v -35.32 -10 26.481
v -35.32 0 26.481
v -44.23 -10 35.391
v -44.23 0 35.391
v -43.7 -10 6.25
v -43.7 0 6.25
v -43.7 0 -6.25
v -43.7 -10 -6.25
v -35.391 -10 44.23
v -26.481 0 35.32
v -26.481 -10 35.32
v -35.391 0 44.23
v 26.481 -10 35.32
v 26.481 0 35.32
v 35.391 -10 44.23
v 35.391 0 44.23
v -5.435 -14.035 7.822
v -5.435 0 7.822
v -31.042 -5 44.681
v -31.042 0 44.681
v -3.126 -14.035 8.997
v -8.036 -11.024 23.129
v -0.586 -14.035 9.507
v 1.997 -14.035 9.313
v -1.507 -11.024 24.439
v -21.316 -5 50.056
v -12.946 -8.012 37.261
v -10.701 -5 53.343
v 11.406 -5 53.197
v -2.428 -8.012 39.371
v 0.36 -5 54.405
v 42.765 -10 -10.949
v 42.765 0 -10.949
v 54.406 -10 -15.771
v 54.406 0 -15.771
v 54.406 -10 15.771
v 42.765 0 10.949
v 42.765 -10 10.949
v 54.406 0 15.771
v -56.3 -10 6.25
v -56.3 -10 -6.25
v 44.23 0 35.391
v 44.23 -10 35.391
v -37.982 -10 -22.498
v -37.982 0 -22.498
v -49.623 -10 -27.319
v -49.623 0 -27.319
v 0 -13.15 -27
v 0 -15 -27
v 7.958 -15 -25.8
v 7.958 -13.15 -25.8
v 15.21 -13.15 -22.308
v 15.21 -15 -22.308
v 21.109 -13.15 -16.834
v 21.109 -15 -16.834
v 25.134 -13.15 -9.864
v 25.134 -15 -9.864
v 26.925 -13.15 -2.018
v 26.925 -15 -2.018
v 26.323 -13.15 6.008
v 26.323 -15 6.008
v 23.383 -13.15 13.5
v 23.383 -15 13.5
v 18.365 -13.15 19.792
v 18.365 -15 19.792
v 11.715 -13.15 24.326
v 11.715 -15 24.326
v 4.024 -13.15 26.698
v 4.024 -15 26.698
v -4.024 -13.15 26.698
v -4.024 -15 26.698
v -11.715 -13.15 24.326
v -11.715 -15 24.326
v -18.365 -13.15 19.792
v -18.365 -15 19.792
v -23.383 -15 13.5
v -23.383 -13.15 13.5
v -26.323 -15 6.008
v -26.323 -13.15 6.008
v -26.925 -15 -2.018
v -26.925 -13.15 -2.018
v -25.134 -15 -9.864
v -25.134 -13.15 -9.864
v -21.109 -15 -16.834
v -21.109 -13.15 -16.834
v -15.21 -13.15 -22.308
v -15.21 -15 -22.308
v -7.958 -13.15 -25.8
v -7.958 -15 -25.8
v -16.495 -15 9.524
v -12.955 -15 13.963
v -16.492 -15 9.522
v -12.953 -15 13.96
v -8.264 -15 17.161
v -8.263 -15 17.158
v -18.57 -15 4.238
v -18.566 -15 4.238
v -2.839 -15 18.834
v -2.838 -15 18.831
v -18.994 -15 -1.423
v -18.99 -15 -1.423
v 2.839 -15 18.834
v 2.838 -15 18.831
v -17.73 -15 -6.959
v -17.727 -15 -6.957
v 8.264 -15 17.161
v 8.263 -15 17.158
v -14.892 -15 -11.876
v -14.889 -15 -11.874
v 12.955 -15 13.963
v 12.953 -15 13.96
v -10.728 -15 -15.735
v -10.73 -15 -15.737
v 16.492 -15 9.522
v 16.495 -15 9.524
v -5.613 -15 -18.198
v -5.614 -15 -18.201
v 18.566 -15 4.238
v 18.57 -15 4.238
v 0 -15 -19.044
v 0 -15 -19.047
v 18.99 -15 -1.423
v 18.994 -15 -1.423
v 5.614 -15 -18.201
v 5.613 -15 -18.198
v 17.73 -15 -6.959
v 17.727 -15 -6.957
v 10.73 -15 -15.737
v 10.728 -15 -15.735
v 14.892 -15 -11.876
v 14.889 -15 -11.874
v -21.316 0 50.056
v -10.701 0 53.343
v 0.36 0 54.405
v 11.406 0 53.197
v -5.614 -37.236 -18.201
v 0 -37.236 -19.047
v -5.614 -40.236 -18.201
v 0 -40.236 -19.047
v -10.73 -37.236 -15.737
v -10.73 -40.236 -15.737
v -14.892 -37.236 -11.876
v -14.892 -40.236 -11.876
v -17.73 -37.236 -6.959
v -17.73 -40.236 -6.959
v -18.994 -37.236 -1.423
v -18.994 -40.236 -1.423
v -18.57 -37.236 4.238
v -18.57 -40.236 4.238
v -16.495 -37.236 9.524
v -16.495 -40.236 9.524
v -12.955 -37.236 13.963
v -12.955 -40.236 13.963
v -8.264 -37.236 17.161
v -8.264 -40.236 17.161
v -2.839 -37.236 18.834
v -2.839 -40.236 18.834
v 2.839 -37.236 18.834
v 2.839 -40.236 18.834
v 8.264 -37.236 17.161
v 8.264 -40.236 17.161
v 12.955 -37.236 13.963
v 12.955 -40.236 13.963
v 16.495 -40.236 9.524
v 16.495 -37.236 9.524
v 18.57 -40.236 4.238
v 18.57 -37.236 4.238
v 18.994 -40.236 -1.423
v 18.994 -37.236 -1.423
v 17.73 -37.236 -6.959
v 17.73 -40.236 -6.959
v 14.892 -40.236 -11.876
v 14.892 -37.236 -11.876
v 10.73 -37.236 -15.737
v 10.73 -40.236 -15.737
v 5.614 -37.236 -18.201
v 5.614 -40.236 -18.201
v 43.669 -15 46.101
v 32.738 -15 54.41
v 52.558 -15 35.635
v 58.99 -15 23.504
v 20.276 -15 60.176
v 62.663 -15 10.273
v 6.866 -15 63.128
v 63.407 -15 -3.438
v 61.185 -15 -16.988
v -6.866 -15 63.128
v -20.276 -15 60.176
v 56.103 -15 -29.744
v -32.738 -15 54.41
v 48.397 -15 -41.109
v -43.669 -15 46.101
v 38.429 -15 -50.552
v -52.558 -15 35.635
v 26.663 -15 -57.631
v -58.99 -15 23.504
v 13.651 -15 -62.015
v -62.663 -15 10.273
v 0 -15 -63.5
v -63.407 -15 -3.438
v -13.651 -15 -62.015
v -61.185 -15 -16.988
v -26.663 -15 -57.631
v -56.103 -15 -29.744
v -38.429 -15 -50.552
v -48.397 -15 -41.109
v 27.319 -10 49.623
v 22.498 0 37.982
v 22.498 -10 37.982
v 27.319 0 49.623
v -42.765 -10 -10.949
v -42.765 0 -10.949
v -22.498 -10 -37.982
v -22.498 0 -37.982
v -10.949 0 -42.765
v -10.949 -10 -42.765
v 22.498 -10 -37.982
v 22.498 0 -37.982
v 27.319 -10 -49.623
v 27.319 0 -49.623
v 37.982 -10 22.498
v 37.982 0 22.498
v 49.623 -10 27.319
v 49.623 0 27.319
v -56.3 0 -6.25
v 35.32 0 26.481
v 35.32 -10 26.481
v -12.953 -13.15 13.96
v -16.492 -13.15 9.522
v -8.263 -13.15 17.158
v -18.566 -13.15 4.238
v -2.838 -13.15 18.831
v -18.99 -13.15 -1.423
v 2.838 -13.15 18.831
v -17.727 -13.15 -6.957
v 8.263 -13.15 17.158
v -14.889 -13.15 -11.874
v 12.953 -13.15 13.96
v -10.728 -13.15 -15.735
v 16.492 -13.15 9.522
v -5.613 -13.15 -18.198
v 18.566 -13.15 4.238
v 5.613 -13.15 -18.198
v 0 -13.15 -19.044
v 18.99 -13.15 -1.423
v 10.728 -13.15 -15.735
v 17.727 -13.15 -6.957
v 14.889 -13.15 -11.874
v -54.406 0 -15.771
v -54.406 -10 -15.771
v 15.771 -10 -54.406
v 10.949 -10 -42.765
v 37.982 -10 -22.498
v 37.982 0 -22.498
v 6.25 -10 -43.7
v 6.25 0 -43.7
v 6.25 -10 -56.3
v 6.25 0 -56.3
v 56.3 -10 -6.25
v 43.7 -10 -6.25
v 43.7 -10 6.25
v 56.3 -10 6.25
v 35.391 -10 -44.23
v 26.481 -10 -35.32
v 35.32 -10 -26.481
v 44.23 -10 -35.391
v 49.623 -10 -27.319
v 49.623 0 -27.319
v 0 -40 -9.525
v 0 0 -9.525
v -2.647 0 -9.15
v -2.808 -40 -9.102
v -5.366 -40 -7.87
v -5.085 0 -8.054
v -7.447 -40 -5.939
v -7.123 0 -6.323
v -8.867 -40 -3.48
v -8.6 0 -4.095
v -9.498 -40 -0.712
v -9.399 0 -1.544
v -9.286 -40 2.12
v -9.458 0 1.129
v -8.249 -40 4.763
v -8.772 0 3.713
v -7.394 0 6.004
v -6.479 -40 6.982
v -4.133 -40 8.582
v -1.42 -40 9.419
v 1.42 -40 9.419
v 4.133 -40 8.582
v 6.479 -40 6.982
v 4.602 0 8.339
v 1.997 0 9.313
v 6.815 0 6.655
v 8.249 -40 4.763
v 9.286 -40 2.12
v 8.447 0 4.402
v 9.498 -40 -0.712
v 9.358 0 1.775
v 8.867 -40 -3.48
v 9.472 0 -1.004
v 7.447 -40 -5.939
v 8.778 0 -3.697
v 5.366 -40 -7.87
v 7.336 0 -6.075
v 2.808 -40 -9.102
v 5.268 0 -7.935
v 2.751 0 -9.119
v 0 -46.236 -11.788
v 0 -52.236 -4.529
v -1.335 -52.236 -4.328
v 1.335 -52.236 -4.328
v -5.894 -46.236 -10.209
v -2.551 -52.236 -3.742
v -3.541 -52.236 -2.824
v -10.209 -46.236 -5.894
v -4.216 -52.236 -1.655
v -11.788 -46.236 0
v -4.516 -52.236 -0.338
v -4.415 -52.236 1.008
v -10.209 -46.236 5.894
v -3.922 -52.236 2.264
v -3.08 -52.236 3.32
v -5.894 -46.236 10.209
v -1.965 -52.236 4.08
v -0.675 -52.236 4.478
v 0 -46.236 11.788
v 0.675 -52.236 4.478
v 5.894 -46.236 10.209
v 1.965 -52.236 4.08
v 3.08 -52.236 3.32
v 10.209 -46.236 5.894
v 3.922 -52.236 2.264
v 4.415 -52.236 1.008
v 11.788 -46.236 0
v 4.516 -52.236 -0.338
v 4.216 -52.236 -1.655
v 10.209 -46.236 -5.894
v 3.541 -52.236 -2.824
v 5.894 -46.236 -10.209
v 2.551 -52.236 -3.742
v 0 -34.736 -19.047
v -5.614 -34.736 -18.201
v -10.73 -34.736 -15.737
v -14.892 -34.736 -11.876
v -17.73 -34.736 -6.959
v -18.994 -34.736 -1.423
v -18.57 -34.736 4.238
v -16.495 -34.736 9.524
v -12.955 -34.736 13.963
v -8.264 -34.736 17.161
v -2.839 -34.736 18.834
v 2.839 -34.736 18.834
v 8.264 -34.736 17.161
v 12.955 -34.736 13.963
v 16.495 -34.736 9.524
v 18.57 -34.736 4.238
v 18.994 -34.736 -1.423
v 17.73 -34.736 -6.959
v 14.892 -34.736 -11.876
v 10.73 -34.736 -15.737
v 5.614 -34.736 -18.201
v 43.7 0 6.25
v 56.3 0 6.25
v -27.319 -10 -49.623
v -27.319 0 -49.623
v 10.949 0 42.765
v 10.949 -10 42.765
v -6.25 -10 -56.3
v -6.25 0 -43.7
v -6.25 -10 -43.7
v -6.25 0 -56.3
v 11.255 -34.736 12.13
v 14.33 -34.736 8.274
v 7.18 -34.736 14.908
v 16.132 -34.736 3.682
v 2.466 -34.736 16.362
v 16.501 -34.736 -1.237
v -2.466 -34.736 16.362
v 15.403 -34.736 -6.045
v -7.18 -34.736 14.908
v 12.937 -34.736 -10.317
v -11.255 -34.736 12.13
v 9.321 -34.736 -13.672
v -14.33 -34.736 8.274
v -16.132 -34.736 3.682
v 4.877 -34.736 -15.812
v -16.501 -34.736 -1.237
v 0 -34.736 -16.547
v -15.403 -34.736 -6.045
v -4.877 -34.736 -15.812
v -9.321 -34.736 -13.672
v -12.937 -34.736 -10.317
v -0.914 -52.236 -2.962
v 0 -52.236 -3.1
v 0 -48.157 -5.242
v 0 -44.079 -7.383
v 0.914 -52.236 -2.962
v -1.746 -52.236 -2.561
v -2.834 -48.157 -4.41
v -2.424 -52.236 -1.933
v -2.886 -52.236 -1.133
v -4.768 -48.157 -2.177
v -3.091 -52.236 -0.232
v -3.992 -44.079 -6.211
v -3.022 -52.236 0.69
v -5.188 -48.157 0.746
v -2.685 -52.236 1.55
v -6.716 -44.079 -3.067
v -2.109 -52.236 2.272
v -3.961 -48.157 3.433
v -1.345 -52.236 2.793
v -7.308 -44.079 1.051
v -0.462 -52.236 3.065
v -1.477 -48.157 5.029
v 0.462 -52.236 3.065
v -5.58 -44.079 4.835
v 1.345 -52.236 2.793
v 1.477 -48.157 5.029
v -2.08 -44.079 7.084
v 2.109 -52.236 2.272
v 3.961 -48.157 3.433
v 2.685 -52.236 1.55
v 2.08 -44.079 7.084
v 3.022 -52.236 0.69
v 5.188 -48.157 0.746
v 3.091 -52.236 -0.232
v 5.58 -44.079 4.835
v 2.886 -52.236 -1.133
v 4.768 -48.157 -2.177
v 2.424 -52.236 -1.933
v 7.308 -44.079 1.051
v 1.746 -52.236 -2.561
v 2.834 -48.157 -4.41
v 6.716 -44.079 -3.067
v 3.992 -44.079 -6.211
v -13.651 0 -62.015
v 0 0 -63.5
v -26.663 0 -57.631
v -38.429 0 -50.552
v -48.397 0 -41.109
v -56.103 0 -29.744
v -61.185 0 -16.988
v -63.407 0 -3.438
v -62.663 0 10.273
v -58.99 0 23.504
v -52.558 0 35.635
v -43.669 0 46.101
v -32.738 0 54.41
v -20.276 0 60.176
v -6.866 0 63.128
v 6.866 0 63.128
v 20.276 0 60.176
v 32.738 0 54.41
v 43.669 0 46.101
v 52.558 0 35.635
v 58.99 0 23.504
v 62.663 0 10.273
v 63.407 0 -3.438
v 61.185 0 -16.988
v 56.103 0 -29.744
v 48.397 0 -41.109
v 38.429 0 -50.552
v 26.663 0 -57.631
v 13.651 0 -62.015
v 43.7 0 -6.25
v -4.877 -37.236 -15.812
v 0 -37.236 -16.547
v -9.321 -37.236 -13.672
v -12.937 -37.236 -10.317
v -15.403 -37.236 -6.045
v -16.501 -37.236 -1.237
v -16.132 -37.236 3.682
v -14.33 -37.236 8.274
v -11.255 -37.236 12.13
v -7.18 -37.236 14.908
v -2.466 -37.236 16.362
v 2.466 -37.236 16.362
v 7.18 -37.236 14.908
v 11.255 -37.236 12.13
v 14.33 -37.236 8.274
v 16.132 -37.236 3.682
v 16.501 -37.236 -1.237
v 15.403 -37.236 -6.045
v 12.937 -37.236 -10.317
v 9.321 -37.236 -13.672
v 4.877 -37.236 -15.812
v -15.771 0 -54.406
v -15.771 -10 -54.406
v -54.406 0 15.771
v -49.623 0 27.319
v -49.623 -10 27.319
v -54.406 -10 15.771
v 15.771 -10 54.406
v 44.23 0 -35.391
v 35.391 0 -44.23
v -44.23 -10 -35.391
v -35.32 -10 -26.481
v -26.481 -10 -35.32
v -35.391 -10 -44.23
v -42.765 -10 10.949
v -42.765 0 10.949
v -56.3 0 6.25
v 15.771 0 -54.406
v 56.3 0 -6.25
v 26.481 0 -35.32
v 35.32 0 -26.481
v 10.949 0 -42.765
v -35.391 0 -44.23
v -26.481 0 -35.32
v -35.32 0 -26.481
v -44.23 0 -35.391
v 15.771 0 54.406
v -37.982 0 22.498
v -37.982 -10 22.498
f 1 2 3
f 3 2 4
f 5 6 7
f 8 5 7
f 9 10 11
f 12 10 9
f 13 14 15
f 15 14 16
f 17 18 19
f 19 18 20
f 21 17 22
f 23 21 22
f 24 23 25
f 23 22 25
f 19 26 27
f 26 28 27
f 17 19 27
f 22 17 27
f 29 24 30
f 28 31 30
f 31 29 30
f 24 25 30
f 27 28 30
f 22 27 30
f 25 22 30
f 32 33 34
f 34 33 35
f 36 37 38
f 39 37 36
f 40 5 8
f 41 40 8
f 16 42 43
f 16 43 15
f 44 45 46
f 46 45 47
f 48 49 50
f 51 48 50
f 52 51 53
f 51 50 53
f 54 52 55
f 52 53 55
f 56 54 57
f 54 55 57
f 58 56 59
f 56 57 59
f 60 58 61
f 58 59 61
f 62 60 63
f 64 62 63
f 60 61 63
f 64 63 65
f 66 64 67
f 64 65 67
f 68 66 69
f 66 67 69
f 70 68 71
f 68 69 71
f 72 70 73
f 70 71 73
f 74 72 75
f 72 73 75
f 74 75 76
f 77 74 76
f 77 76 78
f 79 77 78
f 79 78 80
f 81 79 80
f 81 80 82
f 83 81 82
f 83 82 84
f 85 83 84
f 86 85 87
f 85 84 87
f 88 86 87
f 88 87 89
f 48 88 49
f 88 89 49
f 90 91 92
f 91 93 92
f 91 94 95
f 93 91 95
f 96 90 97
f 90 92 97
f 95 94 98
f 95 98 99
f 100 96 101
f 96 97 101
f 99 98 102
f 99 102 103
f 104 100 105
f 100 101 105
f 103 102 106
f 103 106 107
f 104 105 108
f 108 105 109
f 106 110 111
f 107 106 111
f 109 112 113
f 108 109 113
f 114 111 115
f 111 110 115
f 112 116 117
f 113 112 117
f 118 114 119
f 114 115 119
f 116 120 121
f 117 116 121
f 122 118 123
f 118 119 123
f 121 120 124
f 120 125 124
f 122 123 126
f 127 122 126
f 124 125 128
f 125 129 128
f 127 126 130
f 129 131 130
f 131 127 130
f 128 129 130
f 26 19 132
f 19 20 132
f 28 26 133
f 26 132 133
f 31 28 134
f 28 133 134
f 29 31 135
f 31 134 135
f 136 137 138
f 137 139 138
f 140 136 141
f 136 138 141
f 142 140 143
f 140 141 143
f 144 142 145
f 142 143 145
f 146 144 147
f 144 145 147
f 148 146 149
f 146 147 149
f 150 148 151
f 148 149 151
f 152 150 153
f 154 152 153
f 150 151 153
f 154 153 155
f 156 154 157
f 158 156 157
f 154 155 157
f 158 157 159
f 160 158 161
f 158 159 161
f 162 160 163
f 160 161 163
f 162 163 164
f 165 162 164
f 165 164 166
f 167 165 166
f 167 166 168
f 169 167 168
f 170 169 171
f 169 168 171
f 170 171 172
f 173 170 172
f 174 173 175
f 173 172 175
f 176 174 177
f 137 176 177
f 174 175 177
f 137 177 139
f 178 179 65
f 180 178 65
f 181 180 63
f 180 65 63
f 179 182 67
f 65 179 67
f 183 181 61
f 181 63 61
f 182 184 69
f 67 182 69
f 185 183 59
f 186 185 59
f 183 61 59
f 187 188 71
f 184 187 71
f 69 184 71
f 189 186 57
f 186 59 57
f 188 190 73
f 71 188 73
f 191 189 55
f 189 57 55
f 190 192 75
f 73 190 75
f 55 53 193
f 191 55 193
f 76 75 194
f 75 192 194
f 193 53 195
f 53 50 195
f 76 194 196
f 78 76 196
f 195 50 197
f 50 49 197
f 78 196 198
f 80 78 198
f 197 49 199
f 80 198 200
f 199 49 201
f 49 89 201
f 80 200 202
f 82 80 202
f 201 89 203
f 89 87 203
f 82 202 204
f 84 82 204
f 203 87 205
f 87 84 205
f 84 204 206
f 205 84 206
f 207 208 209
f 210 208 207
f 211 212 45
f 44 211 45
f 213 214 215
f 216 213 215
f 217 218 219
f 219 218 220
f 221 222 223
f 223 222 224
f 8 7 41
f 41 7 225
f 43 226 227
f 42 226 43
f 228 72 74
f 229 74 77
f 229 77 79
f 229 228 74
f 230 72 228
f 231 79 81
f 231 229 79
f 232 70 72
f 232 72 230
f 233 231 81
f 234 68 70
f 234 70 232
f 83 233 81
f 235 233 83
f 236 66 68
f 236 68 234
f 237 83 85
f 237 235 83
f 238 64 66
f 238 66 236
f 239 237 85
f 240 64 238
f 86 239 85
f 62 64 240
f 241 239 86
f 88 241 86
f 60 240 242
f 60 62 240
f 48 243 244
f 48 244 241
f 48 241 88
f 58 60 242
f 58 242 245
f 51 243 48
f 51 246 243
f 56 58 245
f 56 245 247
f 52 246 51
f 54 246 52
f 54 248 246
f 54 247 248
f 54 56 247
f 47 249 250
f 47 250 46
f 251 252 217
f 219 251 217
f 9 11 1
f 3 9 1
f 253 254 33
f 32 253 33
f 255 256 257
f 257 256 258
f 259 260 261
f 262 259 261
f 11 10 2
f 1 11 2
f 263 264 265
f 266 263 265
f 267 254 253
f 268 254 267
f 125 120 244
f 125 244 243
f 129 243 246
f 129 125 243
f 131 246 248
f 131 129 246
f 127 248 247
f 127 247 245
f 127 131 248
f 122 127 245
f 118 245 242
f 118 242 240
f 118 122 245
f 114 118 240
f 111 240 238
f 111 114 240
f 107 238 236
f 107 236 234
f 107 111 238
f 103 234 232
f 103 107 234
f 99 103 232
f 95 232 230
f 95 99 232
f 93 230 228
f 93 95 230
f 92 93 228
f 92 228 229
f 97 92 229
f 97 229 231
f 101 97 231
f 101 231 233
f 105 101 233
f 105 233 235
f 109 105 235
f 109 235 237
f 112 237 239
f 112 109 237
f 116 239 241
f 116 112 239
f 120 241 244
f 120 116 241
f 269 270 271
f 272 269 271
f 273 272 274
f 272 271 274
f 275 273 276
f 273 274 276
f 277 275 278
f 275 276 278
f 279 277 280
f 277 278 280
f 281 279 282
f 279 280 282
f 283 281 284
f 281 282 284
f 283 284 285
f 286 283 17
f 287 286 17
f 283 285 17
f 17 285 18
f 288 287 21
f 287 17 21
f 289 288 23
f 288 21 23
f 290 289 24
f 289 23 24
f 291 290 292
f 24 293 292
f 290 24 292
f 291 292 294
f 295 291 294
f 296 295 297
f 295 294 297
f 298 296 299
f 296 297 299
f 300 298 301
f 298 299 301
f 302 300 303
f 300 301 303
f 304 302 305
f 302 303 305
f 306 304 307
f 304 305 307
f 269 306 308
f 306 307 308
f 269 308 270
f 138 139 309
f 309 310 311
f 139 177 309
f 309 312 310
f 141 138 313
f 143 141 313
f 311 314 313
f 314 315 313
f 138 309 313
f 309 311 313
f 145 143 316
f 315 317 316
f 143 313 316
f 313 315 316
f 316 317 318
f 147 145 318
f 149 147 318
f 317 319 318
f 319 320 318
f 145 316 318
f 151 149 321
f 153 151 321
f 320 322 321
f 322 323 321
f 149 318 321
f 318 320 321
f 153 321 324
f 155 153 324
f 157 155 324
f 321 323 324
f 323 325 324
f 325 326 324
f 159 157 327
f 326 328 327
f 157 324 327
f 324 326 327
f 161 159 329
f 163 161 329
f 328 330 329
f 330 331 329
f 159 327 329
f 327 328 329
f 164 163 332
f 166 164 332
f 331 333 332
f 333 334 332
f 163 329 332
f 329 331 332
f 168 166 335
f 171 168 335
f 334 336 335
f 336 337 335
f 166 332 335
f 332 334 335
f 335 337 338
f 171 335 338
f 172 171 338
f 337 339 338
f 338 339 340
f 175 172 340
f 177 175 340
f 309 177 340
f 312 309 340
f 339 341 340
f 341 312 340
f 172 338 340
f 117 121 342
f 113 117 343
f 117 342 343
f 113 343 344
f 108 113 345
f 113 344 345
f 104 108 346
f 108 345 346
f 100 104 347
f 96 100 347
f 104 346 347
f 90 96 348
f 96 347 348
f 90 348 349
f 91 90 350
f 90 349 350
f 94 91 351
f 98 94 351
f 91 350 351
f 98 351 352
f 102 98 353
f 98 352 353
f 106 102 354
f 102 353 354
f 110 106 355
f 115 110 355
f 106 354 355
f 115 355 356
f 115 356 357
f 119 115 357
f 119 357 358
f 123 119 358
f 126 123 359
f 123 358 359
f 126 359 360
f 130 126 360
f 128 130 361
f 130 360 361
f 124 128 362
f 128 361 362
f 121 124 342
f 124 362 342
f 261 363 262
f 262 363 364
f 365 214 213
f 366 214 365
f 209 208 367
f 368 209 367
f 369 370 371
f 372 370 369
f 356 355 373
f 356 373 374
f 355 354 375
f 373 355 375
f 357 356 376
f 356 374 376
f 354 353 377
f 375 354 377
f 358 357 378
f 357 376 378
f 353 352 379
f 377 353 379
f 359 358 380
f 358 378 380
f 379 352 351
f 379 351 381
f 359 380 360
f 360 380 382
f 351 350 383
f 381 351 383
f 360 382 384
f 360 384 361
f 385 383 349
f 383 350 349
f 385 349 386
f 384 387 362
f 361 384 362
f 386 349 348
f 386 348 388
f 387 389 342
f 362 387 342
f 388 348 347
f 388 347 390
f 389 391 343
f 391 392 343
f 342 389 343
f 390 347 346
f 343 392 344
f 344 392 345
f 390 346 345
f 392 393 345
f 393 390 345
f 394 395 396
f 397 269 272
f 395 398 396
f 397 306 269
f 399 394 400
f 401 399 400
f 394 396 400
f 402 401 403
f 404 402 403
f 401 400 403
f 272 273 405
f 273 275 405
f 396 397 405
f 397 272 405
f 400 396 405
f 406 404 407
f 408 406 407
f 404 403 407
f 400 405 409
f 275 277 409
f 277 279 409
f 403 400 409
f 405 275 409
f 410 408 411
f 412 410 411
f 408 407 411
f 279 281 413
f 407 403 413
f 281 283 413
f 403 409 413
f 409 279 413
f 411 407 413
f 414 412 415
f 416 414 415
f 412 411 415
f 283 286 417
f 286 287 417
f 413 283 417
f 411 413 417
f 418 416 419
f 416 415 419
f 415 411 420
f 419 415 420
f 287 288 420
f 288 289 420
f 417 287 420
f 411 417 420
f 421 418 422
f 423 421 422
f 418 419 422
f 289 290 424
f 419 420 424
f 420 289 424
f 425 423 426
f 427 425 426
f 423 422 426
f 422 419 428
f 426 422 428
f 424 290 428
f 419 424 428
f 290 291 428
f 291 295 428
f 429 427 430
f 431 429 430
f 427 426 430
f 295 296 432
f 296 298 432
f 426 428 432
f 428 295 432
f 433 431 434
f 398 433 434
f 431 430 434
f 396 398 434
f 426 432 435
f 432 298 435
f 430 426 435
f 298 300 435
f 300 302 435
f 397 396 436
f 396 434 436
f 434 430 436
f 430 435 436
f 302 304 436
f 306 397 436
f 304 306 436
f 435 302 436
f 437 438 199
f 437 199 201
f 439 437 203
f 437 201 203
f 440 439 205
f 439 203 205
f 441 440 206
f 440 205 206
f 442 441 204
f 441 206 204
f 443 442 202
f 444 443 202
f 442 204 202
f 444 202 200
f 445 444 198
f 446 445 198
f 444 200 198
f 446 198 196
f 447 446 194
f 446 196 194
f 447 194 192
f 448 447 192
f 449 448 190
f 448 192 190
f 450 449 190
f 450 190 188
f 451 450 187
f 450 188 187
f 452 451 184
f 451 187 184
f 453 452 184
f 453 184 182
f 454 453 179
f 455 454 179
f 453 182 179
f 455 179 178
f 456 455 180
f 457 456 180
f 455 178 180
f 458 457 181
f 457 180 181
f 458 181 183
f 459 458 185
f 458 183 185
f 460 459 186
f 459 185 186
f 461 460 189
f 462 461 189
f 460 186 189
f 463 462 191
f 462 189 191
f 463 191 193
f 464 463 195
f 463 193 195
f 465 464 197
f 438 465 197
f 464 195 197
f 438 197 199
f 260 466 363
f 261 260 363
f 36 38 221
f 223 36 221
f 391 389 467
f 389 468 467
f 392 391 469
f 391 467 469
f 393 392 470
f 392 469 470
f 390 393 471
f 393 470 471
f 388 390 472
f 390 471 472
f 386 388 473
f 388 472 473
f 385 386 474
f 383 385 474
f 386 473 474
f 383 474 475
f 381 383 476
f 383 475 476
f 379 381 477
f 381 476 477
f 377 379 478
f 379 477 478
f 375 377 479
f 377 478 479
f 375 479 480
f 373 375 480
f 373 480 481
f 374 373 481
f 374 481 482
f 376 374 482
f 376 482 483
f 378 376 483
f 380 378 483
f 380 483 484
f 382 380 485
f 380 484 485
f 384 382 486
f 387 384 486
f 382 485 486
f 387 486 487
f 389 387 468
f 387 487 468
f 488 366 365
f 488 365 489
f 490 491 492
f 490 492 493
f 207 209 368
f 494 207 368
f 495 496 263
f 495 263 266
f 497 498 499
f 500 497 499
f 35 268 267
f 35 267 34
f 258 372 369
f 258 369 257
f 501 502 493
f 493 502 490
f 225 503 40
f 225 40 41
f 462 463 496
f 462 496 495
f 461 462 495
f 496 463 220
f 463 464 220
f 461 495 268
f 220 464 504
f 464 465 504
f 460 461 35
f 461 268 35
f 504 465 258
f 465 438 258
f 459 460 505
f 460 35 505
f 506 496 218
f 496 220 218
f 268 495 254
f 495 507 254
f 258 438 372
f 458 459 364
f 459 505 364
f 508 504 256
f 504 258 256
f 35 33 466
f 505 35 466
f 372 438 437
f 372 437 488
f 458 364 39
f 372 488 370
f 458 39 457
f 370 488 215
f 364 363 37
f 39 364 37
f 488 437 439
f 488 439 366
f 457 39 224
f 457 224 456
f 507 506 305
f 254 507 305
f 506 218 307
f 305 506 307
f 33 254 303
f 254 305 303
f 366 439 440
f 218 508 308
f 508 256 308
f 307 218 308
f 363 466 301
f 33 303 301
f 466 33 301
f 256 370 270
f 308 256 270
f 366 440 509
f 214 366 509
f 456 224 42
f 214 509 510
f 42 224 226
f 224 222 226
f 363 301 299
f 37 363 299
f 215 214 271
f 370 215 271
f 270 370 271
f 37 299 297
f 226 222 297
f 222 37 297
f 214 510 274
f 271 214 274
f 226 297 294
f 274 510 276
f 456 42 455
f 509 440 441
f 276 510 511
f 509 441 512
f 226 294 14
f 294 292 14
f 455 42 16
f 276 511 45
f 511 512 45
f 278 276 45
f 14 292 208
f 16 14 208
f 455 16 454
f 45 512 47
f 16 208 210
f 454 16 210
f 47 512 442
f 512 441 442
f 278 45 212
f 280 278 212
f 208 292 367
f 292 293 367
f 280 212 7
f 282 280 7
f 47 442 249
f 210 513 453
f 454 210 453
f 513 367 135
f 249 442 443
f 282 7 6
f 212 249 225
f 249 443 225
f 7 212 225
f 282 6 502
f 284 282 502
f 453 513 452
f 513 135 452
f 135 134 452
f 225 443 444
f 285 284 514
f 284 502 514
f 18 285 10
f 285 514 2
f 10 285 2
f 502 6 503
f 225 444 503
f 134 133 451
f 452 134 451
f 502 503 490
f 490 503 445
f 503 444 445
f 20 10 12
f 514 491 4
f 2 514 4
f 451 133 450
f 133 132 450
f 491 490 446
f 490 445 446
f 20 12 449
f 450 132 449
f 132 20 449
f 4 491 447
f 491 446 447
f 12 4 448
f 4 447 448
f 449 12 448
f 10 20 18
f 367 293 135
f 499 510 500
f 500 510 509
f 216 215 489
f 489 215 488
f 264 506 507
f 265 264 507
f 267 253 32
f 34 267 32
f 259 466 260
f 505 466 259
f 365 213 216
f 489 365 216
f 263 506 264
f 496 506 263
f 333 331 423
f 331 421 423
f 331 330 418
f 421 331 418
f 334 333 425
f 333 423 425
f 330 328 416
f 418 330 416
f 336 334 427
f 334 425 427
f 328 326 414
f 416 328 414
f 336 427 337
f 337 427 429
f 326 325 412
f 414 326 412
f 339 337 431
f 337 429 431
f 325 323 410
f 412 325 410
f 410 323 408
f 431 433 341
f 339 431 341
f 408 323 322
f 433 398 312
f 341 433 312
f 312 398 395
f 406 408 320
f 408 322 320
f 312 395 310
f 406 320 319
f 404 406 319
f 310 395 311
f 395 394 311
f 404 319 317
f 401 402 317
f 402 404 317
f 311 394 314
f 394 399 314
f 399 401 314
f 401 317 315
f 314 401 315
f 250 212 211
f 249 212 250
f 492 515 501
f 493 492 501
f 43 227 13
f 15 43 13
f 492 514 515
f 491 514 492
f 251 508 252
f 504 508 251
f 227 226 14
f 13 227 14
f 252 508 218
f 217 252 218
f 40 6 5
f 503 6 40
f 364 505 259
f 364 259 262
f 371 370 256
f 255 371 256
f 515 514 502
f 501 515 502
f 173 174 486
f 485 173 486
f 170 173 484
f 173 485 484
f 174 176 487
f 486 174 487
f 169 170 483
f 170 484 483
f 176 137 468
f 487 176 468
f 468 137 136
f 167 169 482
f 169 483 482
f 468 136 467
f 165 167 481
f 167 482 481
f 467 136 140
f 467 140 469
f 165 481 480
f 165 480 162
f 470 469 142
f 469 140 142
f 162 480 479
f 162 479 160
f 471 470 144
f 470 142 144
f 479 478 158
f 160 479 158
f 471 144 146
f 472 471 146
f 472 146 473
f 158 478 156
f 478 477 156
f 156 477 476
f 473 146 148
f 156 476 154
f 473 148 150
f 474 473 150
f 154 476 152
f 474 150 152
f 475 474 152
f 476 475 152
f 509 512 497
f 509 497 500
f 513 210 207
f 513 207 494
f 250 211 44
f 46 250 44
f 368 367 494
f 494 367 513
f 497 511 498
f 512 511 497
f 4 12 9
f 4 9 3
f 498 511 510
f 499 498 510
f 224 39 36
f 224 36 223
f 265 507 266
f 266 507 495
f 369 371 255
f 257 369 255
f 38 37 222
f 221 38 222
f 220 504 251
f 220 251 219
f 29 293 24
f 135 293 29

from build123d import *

# Parameters (mm, degrees)
SKETCH3_W          = 12.5
SKETCH3_H          = 12.6
CUT_EXTRUDE1_DEPTH = 10
CIRPATTERN1_COUNT  = 16
CUT_SWEEP3_ANGLE   = 46.890766
SKETCH8_R          = 27
SKETCH8_R_2        = 19.043703719
CUT_EXTRUDE2_DEPTH = 1.85


# Read off the part's stored shape, not the designer's step: Cut-Sweep3
with BuildPart() as part:
    # Sketch1 → Revolve1 (revolve)
    with BuildSketch(Plane(origin=(0, 0, 0), x_dir=(0, 0, -1), z_dir=(1, 0, 0))):
        Polygon((9.525, 0), (63.5, 0), (63.5, -15), (19.047086271, -15), (19.047086271, -34.735580232), (16.547086271, -34.735580232), (16.547086271, -37.235580232), (19.047086271, -37.235580232), (19.047086271, -40.235580232), (4.528779807, -52.235580232), (3.1, -52.235580232), (9.525, -40), align=None)
    revolve(axis=Axis((0, 0, 0), (0, 1, 0)))

    # Sketch3 → Cut-Extrude1 (cut)
    with BuildSketch(Plane(origin=(0, 0, 0), x_dir=(1, 0, 0), z_dir=(0, 1, 0))):
        with Locations((0, 50)):
            Rectangle(SKETCH3_W, SKETCH3_H)
    cut_extrude1 = extrude(amount=-CUT_EXTRUDE1_DEPTH, mode=Mode.SUBTRACT)

    # CirPattern1: Cut-Extrude1 ×16 about axis, 2 skipped
    cirpattern1_axis = Axis((0, 0, 0), (0, -1, 0))
    add([cut_extrude1.rotate(cirpattern1_axis, i * 360 / CIRPATTERN1_COUNT) for i in range(1, CIRPATTERN1_COUNT) if i not in (8, 9)], mode=Mode.SUBTRACT)

    # Cut-Sweep3 outline → Cut-Sweep3 (revolve, cut)
    with BuildSketch(Plane(origin=(0, 0, 0), x_dir=(-0.5705578043075098, 0, 0.8212574455941287), z_dir=(-0.8212574455941287, 0, -0.5705578043075098))):
        Polygon((54.406189133, -5), (54.406189133, 0), (9.525, 0), (9.525, -14.035371812), align=None)
    revolve(axis=Axis((0, 0, 0), (0, 1, 0)), revolution_arc=CUT_SWEEP3_ANGLE, mode=Mode.SUBTRACT)

    # Sketch8 → Cut-Extrude2 (cut)
    with BuildSketch(Plane.XZ.offset(15)):
        with Locations(Location((0, 0, 0), (0, 0, 270))):
            Circle(SKETCH8_R)
        with Locations(Location((0, 0, 0), (0, 0, 270))):
            Circle(SKETCH8_R_2, mode=Mode.SUBTRACT)
    extrude(amount=-CUT_EXTRUDE2_DEPTH, mode=Mode.SUBTRACT)


solid = part.part
